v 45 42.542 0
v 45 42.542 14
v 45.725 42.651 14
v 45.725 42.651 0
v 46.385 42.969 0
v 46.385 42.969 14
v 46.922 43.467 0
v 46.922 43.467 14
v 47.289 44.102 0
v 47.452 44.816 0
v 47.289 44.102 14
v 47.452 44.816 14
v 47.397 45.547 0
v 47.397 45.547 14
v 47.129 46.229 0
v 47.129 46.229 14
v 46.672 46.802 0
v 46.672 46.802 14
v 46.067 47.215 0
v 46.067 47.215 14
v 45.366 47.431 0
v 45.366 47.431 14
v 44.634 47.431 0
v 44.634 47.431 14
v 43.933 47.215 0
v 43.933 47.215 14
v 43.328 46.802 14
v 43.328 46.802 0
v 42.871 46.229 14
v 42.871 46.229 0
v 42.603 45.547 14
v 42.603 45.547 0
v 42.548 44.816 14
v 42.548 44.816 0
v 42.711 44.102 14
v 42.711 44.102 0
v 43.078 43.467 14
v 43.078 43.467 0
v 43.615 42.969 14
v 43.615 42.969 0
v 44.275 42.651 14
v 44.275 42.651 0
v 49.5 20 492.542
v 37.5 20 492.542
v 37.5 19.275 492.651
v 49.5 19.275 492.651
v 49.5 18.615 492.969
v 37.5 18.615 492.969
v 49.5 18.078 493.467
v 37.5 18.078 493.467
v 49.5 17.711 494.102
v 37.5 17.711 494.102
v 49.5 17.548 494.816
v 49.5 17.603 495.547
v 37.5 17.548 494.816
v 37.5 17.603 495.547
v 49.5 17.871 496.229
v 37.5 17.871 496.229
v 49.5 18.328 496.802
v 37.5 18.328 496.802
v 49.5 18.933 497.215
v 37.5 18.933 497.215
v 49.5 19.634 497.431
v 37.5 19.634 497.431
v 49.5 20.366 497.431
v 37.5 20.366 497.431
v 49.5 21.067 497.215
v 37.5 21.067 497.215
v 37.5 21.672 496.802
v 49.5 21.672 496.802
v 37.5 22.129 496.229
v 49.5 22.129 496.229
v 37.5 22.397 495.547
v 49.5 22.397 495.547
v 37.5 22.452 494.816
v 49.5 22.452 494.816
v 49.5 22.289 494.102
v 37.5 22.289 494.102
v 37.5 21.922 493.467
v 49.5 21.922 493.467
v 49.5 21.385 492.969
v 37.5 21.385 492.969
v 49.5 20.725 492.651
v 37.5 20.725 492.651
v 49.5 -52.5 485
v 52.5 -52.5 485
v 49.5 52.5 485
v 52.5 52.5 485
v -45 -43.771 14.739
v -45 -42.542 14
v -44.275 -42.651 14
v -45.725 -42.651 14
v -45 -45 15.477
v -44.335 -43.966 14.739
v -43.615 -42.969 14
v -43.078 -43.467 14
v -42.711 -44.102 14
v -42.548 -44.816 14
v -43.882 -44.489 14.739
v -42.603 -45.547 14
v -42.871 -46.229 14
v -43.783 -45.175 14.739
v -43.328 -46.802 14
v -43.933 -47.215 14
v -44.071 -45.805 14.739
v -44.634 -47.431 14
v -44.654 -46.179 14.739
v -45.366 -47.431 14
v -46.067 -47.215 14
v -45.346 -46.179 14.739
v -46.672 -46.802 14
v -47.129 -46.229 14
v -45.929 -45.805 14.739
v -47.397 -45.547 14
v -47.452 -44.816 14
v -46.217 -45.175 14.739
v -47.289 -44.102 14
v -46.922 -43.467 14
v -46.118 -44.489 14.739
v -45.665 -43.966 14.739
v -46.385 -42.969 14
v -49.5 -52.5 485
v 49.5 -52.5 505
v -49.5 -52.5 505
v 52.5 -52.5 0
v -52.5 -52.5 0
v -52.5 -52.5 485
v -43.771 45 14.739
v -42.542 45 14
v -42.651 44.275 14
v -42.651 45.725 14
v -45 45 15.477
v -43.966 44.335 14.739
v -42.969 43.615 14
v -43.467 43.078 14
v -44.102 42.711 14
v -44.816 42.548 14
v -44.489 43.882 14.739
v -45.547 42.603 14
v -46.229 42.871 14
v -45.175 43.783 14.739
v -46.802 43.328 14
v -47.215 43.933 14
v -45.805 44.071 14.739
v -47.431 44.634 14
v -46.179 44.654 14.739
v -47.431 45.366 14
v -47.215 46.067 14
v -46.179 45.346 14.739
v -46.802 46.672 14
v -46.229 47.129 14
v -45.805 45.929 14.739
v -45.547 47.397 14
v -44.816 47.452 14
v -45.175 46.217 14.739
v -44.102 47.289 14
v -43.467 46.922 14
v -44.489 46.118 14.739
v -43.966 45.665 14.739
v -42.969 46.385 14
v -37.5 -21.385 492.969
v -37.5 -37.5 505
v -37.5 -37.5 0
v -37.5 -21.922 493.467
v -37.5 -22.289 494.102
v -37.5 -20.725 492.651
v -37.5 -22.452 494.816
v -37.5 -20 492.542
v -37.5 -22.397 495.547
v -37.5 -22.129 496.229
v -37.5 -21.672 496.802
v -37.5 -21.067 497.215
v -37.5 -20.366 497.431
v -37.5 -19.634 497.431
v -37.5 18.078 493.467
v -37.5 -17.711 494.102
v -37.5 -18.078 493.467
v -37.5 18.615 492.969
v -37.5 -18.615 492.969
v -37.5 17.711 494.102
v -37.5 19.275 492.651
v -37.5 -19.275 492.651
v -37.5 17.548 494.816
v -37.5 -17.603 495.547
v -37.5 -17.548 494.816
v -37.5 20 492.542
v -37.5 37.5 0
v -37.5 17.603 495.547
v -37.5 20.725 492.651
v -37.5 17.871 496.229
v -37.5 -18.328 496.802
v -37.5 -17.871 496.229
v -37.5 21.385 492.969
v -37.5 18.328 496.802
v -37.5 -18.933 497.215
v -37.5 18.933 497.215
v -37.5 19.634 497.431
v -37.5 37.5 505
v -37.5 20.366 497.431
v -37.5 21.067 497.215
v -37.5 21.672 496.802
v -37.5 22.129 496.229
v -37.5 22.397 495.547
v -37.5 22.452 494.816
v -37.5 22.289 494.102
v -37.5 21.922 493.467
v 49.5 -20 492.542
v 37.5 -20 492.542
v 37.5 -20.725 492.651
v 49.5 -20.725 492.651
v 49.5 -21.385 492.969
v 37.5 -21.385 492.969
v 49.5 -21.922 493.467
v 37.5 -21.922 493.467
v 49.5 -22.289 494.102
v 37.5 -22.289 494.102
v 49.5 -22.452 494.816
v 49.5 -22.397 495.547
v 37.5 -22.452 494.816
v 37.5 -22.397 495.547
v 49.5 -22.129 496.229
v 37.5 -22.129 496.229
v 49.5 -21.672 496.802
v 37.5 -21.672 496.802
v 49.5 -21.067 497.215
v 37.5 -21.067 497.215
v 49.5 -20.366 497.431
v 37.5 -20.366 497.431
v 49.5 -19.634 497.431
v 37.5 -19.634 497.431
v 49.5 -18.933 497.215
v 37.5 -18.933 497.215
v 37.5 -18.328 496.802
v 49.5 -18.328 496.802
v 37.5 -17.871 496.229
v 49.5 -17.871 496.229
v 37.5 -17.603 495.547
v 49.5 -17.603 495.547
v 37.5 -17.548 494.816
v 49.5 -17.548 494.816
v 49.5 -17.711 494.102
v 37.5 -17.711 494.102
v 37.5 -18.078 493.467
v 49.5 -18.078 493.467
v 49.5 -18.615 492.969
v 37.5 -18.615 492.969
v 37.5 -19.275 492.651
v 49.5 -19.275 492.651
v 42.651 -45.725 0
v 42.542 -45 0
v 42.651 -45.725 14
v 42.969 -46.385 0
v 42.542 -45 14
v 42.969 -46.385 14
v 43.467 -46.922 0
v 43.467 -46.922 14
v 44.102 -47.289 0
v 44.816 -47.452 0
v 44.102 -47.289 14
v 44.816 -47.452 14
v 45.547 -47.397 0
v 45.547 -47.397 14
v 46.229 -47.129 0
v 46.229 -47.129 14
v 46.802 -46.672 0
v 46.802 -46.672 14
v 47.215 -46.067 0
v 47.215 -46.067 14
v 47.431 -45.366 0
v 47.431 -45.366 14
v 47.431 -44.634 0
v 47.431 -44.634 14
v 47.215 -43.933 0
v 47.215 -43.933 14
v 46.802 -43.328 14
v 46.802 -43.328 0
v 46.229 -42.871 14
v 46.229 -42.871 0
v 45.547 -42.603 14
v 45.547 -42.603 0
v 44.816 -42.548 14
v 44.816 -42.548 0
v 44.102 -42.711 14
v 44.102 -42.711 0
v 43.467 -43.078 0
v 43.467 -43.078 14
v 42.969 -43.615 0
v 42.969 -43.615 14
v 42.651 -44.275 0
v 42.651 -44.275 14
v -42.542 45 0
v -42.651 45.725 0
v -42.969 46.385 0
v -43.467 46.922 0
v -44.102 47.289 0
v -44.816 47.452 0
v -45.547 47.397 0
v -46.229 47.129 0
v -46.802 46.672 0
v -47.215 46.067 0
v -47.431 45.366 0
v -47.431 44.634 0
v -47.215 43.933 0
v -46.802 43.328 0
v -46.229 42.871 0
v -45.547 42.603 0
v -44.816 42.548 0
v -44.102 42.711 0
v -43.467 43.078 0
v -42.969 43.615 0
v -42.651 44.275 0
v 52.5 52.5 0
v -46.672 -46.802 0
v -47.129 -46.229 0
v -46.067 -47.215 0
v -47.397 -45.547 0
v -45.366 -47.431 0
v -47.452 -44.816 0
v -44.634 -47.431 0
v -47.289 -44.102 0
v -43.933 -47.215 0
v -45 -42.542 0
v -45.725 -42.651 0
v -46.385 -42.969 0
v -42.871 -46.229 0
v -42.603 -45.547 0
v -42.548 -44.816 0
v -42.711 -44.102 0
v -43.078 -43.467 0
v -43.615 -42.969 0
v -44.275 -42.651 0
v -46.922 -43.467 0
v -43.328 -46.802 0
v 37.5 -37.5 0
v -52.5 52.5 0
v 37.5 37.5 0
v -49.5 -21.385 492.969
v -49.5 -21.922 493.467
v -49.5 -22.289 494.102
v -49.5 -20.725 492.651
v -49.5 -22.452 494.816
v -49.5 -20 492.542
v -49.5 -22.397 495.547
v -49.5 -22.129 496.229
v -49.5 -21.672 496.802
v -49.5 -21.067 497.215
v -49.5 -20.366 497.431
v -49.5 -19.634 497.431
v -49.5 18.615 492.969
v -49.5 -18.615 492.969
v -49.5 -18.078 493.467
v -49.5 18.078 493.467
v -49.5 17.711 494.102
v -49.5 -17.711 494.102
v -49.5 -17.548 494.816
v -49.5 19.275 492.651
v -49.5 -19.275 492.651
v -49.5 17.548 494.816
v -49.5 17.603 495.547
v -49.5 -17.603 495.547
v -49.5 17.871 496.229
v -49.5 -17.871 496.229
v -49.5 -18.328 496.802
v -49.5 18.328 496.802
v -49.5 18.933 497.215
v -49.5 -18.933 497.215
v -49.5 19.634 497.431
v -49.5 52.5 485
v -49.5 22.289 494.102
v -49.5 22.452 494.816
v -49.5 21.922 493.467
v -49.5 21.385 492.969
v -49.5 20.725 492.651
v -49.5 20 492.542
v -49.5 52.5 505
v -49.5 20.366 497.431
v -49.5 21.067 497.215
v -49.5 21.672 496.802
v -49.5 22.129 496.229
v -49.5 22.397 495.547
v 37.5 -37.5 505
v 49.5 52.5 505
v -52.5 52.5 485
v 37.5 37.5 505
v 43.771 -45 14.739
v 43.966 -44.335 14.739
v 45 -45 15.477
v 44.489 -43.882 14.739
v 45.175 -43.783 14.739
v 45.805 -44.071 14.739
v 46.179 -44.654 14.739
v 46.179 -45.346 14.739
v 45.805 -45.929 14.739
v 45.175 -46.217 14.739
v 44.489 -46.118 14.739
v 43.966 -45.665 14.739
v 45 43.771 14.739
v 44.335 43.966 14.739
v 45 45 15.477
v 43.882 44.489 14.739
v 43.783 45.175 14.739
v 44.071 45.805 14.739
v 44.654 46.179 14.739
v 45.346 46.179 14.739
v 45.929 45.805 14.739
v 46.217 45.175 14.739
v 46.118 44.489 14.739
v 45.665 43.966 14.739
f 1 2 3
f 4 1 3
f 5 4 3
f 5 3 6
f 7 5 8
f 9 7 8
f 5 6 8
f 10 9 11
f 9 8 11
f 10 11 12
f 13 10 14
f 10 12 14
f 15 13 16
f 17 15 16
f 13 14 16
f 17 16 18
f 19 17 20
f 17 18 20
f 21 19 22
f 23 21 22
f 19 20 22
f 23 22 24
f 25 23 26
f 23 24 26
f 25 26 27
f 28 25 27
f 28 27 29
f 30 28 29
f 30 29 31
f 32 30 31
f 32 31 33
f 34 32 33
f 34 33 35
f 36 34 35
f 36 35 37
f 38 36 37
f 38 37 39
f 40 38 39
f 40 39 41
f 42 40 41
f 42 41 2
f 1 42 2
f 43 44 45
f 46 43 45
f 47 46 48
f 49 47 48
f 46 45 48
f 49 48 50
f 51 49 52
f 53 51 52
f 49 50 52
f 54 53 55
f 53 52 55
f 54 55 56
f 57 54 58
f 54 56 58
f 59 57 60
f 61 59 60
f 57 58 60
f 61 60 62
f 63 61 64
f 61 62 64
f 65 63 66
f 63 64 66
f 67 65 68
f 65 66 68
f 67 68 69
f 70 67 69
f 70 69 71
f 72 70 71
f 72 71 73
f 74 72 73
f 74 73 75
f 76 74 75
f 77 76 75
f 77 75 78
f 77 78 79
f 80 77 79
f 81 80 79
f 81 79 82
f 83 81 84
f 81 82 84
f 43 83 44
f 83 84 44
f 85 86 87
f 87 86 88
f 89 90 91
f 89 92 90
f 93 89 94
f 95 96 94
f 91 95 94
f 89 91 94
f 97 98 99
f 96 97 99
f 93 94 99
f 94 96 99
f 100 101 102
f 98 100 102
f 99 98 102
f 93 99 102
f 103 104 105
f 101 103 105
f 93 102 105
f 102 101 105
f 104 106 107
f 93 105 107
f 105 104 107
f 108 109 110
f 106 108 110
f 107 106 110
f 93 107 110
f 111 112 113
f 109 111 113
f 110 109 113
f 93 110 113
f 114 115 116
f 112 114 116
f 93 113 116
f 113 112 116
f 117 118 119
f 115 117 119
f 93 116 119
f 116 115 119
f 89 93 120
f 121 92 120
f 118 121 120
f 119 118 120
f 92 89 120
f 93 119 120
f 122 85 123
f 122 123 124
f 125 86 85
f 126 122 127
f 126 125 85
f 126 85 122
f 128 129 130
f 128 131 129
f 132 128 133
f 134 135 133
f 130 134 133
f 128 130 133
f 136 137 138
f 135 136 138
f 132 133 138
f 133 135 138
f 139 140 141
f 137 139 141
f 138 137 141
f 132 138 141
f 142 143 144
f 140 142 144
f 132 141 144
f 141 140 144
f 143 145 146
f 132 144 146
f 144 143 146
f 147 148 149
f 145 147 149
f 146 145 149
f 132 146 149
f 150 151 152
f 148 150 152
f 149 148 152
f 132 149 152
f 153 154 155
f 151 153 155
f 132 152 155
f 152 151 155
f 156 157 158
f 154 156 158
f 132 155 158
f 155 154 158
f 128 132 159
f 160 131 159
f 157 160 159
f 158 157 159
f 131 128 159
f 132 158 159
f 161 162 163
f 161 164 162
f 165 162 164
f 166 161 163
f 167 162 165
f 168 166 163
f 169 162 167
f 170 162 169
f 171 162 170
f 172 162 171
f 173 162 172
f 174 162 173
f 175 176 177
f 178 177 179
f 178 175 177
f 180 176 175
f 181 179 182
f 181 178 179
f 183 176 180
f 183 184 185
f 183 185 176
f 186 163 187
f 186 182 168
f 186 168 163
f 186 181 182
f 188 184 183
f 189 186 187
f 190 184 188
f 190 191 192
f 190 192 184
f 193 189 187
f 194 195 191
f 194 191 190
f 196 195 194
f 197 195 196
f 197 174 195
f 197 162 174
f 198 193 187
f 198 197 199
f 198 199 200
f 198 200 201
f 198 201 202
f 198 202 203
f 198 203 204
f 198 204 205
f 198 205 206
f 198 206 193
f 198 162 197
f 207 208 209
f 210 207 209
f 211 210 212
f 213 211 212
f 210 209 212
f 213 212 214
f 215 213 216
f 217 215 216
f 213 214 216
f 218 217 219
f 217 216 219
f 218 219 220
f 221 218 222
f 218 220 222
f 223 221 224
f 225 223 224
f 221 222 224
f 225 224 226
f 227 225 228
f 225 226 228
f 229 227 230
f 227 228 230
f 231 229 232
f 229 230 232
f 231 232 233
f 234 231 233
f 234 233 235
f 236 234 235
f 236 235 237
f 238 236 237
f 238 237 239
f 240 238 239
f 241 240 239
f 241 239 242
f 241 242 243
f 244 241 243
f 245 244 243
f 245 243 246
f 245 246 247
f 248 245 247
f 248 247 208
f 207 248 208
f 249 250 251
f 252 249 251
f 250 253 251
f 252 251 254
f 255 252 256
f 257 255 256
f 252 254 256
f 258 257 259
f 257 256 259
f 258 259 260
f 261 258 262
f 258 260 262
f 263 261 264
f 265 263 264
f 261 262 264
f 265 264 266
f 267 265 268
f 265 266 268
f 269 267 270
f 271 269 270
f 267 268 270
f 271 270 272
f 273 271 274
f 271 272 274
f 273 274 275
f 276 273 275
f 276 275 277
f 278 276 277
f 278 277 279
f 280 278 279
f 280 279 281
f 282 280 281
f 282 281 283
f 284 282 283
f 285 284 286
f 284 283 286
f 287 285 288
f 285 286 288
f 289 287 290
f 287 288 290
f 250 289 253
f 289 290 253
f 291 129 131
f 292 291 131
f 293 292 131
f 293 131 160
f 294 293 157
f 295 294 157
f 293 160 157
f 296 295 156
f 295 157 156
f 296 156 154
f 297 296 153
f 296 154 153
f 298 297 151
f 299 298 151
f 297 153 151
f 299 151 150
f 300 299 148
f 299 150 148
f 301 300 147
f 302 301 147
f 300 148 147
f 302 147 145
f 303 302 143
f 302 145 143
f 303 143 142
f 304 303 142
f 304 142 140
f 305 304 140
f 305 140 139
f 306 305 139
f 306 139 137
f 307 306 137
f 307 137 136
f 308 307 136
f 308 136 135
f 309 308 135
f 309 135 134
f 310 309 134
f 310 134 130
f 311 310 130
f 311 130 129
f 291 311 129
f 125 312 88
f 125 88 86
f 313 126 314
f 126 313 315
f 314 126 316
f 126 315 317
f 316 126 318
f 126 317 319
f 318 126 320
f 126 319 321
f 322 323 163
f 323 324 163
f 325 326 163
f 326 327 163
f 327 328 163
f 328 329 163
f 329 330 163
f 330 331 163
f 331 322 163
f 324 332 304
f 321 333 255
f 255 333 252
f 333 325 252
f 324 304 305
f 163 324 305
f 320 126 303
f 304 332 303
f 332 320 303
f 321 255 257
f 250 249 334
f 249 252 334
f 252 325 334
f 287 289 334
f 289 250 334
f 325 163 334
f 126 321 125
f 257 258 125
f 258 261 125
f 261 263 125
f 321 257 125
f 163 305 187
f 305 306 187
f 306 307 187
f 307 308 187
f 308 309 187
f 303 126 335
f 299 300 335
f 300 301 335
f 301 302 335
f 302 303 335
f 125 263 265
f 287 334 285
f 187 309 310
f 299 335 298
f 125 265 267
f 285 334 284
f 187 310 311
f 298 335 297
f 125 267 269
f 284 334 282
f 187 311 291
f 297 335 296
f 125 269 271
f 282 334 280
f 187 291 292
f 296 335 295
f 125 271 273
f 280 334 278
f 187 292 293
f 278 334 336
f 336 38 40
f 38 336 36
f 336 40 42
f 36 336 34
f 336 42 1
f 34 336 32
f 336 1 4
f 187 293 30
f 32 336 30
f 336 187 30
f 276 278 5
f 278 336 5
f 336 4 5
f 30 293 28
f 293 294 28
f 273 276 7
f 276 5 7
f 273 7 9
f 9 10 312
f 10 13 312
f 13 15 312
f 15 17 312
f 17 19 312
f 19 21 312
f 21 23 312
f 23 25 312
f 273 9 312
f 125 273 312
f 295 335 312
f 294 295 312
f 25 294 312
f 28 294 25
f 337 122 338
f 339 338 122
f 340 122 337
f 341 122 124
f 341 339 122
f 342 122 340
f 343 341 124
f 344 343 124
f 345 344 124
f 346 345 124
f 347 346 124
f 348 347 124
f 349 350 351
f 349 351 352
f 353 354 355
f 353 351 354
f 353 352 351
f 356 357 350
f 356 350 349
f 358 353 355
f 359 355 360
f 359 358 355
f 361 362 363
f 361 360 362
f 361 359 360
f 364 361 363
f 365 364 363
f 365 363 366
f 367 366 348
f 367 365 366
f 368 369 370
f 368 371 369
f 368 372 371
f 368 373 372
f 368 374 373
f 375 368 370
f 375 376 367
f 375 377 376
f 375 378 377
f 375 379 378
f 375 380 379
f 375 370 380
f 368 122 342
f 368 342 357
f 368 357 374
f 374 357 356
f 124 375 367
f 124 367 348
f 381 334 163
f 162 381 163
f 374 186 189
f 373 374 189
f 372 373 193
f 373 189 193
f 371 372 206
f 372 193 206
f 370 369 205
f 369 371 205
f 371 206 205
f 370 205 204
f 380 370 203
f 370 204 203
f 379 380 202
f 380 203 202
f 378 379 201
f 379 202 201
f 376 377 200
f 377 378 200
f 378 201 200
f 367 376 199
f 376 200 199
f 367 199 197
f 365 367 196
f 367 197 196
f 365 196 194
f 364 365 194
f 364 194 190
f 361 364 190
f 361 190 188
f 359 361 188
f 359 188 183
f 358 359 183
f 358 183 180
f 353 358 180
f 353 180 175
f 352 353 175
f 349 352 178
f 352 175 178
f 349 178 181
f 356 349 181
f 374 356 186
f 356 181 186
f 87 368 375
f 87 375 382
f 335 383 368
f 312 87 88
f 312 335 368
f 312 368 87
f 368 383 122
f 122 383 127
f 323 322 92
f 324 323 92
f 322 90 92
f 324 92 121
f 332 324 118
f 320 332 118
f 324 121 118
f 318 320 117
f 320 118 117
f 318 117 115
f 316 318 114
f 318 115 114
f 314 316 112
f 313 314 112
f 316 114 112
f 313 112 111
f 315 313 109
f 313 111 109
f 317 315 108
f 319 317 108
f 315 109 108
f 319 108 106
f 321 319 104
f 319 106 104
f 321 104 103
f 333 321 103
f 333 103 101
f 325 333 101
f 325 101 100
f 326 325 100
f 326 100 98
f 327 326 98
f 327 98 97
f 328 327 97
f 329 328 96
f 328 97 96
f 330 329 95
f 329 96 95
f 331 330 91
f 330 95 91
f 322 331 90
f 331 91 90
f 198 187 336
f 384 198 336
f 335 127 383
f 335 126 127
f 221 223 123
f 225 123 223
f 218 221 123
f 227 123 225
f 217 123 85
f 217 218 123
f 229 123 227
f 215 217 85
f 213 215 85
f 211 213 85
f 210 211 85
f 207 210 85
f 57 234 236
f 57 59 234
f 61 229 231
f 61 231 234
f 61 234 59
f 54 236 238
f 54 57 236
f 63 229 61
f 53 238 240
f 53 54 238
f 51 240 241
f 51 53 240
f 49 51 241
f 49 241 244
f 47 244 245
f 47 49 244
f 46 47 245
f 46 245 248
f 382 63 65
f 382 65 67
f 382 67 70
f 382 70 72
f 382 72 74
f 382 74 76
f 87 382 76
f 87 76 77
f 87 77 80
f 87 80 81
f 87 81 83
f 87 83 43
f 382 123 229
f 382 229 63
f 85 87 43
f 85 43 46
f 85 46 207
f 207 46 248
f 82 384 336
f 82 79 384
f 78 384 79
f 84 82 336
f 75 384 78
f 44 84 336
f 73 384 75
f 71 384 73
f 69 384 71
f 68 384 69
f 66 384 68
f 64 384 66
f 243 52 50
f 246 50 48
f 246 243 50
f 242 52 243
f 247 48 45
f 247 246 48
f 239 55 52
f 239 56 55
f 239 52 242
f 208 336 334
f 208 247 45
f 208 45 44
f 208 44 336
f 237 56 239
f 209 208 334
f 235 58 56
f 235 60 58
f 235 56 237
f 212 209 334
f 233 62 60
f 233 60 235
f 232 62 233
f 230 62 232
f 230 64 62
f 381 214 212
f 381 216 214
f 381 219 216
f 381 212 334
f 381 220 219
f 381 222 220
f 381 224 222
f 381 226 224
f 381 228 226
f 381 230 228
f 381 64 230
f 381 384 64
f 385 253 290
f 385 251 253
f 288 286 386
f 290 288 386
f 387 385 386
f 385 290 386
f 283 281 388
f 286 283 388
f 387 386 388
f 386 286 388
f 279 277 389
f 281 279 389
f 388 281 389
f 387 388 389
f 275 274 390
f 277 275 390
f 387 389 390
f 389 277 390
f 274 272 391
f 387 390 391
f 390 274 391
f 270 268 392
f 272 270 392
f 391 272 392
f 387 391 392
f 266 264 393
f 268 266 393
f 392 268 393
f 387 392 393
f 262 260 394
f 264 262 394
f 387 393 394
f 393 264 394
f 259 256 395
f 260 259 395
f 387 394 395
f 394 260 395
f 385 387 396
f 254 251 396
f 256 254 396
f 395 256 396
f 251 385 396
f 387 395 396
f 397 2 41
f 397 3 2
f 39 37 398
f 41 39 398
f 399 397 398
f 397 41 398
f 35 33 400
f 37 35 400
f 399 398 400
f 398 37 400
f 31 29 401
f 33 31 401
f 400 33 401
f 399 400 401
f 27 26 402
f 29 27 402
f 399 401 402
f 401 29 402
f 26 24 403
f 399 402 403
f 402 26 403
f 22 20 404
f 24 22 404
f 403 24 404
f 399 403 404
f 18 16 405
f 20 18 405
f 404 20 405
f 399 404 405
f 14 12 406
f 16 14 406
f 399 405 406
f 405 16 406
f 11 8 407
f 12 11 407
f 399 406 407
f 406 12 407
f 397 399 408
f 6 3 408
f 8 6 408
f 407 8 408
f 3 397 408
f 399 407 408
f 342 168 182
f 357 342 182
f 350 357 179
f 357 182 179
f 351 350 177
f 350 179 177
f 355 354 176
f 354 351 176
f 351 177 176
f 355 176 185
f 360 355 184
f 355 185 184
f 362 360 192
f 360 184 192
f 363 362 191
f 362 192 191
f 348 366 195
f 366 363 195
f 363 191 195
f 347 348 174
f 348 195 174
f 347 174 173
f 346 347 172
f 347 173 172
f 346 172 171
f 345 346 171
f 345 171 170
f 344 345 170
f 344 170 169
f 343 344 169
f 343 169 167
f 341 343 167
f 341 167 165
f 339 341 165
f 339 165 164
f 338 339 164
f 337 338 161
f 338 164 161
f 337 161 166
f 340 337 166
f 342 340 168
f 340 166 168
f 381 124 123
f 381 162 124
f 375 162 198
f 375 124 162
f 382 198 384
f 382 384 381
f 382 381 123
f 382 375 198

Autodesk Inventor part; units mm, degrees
ref_plane "YZ Plane" through (0, 0, 0) normal (1, 0, 0) x (0, 1, 0)
ref_plane "XZ Plane" through (0, 0, 0) normal (0, 1, 0) x (-1, 0, 0)
ref_plane "XY Plane" through (0, 0, 0) normal (0, 0, 1) x (1, 0, 0)
sketch "Skizze1" plane through (0, 0, 0) normal (0, 0, 1) x (1, 0, 0)
  line L0 (-52.5, 52.5) -> (52.5, 52.5)
  line L1 (52.5, 52.5) -> (52.5, -52.5)
  line L2 (52.5, -52.5) -> (-52.5, -52.5)
  line L3 (-52.5, -52.5) -> (-52.5, 52.5)
  line L4 (-52.5, 52.5) -> (52.5, -52.5) construction
  line L5 (52.5, 52.5) -> (-52.5, -52.5) construction
  point P0 (0, 0)
  dimension "d0" = 105
  dimension "d1" = 105
extrude "Extrusion1" add sketch "Skizze1" along normal blind 505
sketch "Skizze2" plane through (0, 0, 505) normal (0, 0, 1) x (1, 0, 0)
  spline S0 degree 3 poles (30.8941, -22.3608) (33.2455, -20.1357) (33.4278, -16.4642) (34.1009, -12.3897) (34.4408, -6.5615) (32.3239, 0.3889) (27.6464, 2.563) (18.7777, 8.3579) (6.0522, 19.3643) (-10.5838, 24.0919) (-22.9306, 22.7109) (-28.1368, 17.5955) (-28.9312, 16.6042) knots 0 0 0 0 0.05535 0.076528 0.211782 0.295547 0.382964 0.432922 0.754884 0.81234 0.967238 1 1 1 1
  spline S1 degree 3 poles (-28.9312, 16.6042) (-32.363, 12.3217) (-33.922, 4.96) (-34.2212, -5.2183) (-33.7128, -11.7973) (-30.1787, -16.4552) (-26.4199, -18.3019) (-21.7499, -13.8164) (-22.8916, -9.4321) (-23.5075, -1.7153) (-24.1566, 7.4044) (-16.6489, 14.0721) (-3.6681, 12.4997) (3.1986, 4.5284) (3.2907, 1.6248) (4.5253, 0.0908) (6.4773, -0.7371) (8.3789, 1.0013) (13.1845, -1.004) (13.6371, -9.218) (17.043, -16.25) (23.1831, -17.8066) (25.3482, -18.6226) (26.133, -19.8789) (26.5745, -22.0211) (27.7048, -23.641) (30.0236, -23.1574) (30.8172, -22.4336) (30.8941, -22.3608) knots 0 0 0 0 0.14153 0.17035 0.245987 0.25892 0.290227 0.326265 0.372233 0.38898 0.482096 0.508256 0.624416 0.647418 0.715274 0.72607 0.746892 0.801722 0.811885 0.848514 0.916356 0.943374 0.948219 0.962959 0.96651 0.98188 0.998188 1 1 1 1
  arc A0 (27.4787, -6.7498) -> (23.9934, -5.2356) centre (25, -7.687) ccw
  line L0 (27.4787, -6.7498) -> (26.0066, -10.1384)
  arc A1 (22.5213, -8.6242) -> (26.0066, -10.1384) centre (25, -7.687) ccw
  line L1 (22.5213, -8.6242) -> (23.9934, -5.2356)
  line L2 (22.5213, -8.6242) -> (23.9934, -5.2356)
  arc A2 (22.5213, -8.6242) -> (26.0066, -10.1384) centre (25, -7.687) ccw
  line L3 (27.4787, -6.7498) -> (26.0066, -10.1384)
  arc A3 (27.4787, -6.7498) -> (23.9934, -5.2356) centre (25, -7.687) ccw
  line L4 (-52.5, 52.5) -> (-52.5, -52.5) construction
  line L5 (-52.5, 0) -> (52.5, 0) construction
  line L6 (52.5, -52.5) -> (52.5, 52.5) construction
  line L7 (-34.1215, 23.4036) -> (-34.1215, -17.2518) construction
  line L8 (34.1216, 27.1841) -> (34.1216, -29.8621) construction
  line L9 (-36.6715, 23.259) -> (37.4151, 23.259) construction
  line L10 (-34.1215, -23.2592) -> (37.4151, -23.2592) construction
  point P0 (0, 0)
  point P1 (0, 0)
  dimension "d4" = 34.1215
  dimension "d6" = 34.1216
  dimension "d10" = 23.259
  dimension "d11" = 23.2592
extrude "Extrusion2" cut sketch "Skizze2" against normal blind 505 contours S1 S0 | L0 A1 L1 A0
sketch "Skizze5" plane through (0, 0, 505) normal (0, 0, 1) x (1, 0, 0)
  line L0 (-37.5, 37.5) -> (37.5, 37.5)
  line L1 (37.5, 37.5) -> (37.5, -37.5)
  line L2 (37.5, -37.5) -> (-37.5, -37.5)
  line L3 (-37.5, -37.5) -> (-37.5, 37.5)
  line L4 (-37.5, 37.5) -> (37.5, -37.5) construction
  line L5 (37.5, 37.5) -> (-37.5, -37.5) construction
  spline S0 degree 3 poles (-28.9312, 16.6042) (-28.1368, 17.5955) (-22.9306, 22.7109) (-10.5838, 24.0919) (6.0522, 19.3643) (18.7777, 8.3579) (27.6464, 2.563) (32.3239, 0.3889) (34.4408, -6.5615) (34.1009, -12.3897) (33.4278, -16.4642) (33.2455, -20.1357) (30.8941, -22.3608) knots 0 0 0 0 0.032762 0.18766 0.245116 0.567078 0.617036 0.704453 0.788218 0.923472 0.94465 1 1 1 1
  spline S1 degree 3 poles (30.8941, -22.3608) (30.8172, -22.4336) (30.0236, -23.1574) (27.7048, -23.641) (26.5745, -22.0211) (26.133, -19.8789) (25.3482, -18.6226) (23.1831, -17.8066) (17.043, -16.25) (13.6371, -9.218) (13.1845, -1.004) (8.3789, 1.0013) (6.4773, -0.7371) (4.5253, 0.0908) (3.2907, 1.6248) (3.1986, 4.5284) (-3.6681, 12.4997) (-16.6489, 14.0721) (-24.1566, 7.4044) (-23.5075, -1.7153) (-22.8916, -9.4321) (-21.7499, -13.8164) (-26.4199, -18.3019) (-30.1787, -16.4552) (-33.7128, -11.7973) (-34.2212, -5.2183) (-33.922, 4.96) (-32.363, 12.3217) (-28.9312, 16.6042) knots 0 0 0 0 0.001812 0.01812 0.03349 0.037041 0.051781 0.056626 0.083644 0.151486 0.188115 0.198278 0.253108 0.27393 0.284726 0.352582 0.375584 0.491744 0.517904 0.61102 0.627767 0.673735 0.709773 0.74108 0.754013 0.82965 0.85847 1 1 1 1
  point P0 (0, 0)
  dimension "d18" = 75
  dimension "d19" = 75
extrude "Extrusion3" cut sketch "Skizze5" against normal blind 505
sketch "Skizze8" plane through (52.5, -52.5, 0) normal (1, 0, 0) x (0, 0, -1)
  line L0 (-505, 0) -> (-505, 105) projected
  line L1 (0, 105) -> (-505, 105) projected
  line L2 (-505, 0) -> (-485, 0)
  line L3 (-485, 0) -> (-485, 105)
  line L4 (-485, 105) -> (-505, 105)
  line L5 (-505, 105) -> (-505, 0)
  point P0 (0, 52.5)
  dimension "d33" = 20
extrude "Extrusion5" cut sketch "Skizze8" against normal blind 3
mirror "Spiegeln2" about plane through (0, 0, 0) normal (1, 0, 0) of "Extrusion5"
sketch "Skizze9" plane through (49.5, -52.5, 0) normal (1, 0, 0) x (0, 0, -1)
  line L0 (-505, 0) -> (-505, 105) projected
  line L1 (-505, 105) -> (-485, 105) projected
  point P0 (0, 52.5)
  point P1 (-495, 32.5)
  point P2 (-495, 72.5)
  dimension "d36" = 10
  dimension "d37" = 40
  dimension "d38" = 32.5
hole "Bohrung2" at (49.5, -20, 495) at (49.5, 20, 495) direction (-1, 0, 0) diameter 4.917 depth 12 thread size "M6x1" class "6H" standard "ISO Metric profile"
mirror "Spiegeln3" about plane through (0, 0, 0) normal (1, 0, 0) of "Bohrung2"
sketch "Skizze11" plane through (0, 0, 0) normal (0, 0, -1) x (-1, 0, 0)
  line L0 (52.5, 52.5) -> (52.5, -52.5) projected
  line L1 (52.5, -52.5) -> (-52.5, -52.5) projected
  point P0 (0, 0)
  point P1 (45, -45)
  dimension "d46" = 7.5
  dimension "d47" = 7.5
hole "Bohrung3" at (-45, -45, 0) direction (0, 0, 1) diameter 4.917 depth 14 tip angle 118 thread size "M6x1" class "6H" standard "ISO Metric profile"
pattern_circular "Runde Anordnung1" count 4 over 360 about axis through (0, 0, -10) along (0, 0, 1) of "Bohrung3"
equation "\"d0\" = Magazin_Laenge"
equation "\"d1\" = Magazin_Breite"
equation "\"d2\" = Magazin_Hoehe"
equation "\"d12\" = Magazin_Hoehe"
equation "\"d18\" = Magazin_Breite - 2 * Wanddicke"
equation "\"d19\" = Magazin_Laenge - 2 * Wanddicke"
equation "\"d20\" = Magazin_Hoehe"
equation "\"d33\" = oberer_Absatz"
equation "\"d36\" = Bohrungsversatz_oben"
equation "\"d37\" = Bohrungsabstand_oben"
equation "\"d38\" = 0.5 * Magazin_Breite - 0.5 * Bohrungsabstand_oben"
equation "\"d46\" = 0.5 * Wanddicke"
equation "\"d47\" = d46"
equation "\"Magazin_Hoehe\" = 505"
equation "\"Magazin_Laenge\" = Magazin_Breite"
equation "\"Wanddicke\" = 15"
equation "\"Bohrungsversatz_oben\" = 10"
equation "\"Bohrungsabstand_oben\" = 40"
equation "\"oberer_Absatz\" = 20"
equation "\"Magazin_Breite\" = 105"
properties part number "TS_Magazin_int"
